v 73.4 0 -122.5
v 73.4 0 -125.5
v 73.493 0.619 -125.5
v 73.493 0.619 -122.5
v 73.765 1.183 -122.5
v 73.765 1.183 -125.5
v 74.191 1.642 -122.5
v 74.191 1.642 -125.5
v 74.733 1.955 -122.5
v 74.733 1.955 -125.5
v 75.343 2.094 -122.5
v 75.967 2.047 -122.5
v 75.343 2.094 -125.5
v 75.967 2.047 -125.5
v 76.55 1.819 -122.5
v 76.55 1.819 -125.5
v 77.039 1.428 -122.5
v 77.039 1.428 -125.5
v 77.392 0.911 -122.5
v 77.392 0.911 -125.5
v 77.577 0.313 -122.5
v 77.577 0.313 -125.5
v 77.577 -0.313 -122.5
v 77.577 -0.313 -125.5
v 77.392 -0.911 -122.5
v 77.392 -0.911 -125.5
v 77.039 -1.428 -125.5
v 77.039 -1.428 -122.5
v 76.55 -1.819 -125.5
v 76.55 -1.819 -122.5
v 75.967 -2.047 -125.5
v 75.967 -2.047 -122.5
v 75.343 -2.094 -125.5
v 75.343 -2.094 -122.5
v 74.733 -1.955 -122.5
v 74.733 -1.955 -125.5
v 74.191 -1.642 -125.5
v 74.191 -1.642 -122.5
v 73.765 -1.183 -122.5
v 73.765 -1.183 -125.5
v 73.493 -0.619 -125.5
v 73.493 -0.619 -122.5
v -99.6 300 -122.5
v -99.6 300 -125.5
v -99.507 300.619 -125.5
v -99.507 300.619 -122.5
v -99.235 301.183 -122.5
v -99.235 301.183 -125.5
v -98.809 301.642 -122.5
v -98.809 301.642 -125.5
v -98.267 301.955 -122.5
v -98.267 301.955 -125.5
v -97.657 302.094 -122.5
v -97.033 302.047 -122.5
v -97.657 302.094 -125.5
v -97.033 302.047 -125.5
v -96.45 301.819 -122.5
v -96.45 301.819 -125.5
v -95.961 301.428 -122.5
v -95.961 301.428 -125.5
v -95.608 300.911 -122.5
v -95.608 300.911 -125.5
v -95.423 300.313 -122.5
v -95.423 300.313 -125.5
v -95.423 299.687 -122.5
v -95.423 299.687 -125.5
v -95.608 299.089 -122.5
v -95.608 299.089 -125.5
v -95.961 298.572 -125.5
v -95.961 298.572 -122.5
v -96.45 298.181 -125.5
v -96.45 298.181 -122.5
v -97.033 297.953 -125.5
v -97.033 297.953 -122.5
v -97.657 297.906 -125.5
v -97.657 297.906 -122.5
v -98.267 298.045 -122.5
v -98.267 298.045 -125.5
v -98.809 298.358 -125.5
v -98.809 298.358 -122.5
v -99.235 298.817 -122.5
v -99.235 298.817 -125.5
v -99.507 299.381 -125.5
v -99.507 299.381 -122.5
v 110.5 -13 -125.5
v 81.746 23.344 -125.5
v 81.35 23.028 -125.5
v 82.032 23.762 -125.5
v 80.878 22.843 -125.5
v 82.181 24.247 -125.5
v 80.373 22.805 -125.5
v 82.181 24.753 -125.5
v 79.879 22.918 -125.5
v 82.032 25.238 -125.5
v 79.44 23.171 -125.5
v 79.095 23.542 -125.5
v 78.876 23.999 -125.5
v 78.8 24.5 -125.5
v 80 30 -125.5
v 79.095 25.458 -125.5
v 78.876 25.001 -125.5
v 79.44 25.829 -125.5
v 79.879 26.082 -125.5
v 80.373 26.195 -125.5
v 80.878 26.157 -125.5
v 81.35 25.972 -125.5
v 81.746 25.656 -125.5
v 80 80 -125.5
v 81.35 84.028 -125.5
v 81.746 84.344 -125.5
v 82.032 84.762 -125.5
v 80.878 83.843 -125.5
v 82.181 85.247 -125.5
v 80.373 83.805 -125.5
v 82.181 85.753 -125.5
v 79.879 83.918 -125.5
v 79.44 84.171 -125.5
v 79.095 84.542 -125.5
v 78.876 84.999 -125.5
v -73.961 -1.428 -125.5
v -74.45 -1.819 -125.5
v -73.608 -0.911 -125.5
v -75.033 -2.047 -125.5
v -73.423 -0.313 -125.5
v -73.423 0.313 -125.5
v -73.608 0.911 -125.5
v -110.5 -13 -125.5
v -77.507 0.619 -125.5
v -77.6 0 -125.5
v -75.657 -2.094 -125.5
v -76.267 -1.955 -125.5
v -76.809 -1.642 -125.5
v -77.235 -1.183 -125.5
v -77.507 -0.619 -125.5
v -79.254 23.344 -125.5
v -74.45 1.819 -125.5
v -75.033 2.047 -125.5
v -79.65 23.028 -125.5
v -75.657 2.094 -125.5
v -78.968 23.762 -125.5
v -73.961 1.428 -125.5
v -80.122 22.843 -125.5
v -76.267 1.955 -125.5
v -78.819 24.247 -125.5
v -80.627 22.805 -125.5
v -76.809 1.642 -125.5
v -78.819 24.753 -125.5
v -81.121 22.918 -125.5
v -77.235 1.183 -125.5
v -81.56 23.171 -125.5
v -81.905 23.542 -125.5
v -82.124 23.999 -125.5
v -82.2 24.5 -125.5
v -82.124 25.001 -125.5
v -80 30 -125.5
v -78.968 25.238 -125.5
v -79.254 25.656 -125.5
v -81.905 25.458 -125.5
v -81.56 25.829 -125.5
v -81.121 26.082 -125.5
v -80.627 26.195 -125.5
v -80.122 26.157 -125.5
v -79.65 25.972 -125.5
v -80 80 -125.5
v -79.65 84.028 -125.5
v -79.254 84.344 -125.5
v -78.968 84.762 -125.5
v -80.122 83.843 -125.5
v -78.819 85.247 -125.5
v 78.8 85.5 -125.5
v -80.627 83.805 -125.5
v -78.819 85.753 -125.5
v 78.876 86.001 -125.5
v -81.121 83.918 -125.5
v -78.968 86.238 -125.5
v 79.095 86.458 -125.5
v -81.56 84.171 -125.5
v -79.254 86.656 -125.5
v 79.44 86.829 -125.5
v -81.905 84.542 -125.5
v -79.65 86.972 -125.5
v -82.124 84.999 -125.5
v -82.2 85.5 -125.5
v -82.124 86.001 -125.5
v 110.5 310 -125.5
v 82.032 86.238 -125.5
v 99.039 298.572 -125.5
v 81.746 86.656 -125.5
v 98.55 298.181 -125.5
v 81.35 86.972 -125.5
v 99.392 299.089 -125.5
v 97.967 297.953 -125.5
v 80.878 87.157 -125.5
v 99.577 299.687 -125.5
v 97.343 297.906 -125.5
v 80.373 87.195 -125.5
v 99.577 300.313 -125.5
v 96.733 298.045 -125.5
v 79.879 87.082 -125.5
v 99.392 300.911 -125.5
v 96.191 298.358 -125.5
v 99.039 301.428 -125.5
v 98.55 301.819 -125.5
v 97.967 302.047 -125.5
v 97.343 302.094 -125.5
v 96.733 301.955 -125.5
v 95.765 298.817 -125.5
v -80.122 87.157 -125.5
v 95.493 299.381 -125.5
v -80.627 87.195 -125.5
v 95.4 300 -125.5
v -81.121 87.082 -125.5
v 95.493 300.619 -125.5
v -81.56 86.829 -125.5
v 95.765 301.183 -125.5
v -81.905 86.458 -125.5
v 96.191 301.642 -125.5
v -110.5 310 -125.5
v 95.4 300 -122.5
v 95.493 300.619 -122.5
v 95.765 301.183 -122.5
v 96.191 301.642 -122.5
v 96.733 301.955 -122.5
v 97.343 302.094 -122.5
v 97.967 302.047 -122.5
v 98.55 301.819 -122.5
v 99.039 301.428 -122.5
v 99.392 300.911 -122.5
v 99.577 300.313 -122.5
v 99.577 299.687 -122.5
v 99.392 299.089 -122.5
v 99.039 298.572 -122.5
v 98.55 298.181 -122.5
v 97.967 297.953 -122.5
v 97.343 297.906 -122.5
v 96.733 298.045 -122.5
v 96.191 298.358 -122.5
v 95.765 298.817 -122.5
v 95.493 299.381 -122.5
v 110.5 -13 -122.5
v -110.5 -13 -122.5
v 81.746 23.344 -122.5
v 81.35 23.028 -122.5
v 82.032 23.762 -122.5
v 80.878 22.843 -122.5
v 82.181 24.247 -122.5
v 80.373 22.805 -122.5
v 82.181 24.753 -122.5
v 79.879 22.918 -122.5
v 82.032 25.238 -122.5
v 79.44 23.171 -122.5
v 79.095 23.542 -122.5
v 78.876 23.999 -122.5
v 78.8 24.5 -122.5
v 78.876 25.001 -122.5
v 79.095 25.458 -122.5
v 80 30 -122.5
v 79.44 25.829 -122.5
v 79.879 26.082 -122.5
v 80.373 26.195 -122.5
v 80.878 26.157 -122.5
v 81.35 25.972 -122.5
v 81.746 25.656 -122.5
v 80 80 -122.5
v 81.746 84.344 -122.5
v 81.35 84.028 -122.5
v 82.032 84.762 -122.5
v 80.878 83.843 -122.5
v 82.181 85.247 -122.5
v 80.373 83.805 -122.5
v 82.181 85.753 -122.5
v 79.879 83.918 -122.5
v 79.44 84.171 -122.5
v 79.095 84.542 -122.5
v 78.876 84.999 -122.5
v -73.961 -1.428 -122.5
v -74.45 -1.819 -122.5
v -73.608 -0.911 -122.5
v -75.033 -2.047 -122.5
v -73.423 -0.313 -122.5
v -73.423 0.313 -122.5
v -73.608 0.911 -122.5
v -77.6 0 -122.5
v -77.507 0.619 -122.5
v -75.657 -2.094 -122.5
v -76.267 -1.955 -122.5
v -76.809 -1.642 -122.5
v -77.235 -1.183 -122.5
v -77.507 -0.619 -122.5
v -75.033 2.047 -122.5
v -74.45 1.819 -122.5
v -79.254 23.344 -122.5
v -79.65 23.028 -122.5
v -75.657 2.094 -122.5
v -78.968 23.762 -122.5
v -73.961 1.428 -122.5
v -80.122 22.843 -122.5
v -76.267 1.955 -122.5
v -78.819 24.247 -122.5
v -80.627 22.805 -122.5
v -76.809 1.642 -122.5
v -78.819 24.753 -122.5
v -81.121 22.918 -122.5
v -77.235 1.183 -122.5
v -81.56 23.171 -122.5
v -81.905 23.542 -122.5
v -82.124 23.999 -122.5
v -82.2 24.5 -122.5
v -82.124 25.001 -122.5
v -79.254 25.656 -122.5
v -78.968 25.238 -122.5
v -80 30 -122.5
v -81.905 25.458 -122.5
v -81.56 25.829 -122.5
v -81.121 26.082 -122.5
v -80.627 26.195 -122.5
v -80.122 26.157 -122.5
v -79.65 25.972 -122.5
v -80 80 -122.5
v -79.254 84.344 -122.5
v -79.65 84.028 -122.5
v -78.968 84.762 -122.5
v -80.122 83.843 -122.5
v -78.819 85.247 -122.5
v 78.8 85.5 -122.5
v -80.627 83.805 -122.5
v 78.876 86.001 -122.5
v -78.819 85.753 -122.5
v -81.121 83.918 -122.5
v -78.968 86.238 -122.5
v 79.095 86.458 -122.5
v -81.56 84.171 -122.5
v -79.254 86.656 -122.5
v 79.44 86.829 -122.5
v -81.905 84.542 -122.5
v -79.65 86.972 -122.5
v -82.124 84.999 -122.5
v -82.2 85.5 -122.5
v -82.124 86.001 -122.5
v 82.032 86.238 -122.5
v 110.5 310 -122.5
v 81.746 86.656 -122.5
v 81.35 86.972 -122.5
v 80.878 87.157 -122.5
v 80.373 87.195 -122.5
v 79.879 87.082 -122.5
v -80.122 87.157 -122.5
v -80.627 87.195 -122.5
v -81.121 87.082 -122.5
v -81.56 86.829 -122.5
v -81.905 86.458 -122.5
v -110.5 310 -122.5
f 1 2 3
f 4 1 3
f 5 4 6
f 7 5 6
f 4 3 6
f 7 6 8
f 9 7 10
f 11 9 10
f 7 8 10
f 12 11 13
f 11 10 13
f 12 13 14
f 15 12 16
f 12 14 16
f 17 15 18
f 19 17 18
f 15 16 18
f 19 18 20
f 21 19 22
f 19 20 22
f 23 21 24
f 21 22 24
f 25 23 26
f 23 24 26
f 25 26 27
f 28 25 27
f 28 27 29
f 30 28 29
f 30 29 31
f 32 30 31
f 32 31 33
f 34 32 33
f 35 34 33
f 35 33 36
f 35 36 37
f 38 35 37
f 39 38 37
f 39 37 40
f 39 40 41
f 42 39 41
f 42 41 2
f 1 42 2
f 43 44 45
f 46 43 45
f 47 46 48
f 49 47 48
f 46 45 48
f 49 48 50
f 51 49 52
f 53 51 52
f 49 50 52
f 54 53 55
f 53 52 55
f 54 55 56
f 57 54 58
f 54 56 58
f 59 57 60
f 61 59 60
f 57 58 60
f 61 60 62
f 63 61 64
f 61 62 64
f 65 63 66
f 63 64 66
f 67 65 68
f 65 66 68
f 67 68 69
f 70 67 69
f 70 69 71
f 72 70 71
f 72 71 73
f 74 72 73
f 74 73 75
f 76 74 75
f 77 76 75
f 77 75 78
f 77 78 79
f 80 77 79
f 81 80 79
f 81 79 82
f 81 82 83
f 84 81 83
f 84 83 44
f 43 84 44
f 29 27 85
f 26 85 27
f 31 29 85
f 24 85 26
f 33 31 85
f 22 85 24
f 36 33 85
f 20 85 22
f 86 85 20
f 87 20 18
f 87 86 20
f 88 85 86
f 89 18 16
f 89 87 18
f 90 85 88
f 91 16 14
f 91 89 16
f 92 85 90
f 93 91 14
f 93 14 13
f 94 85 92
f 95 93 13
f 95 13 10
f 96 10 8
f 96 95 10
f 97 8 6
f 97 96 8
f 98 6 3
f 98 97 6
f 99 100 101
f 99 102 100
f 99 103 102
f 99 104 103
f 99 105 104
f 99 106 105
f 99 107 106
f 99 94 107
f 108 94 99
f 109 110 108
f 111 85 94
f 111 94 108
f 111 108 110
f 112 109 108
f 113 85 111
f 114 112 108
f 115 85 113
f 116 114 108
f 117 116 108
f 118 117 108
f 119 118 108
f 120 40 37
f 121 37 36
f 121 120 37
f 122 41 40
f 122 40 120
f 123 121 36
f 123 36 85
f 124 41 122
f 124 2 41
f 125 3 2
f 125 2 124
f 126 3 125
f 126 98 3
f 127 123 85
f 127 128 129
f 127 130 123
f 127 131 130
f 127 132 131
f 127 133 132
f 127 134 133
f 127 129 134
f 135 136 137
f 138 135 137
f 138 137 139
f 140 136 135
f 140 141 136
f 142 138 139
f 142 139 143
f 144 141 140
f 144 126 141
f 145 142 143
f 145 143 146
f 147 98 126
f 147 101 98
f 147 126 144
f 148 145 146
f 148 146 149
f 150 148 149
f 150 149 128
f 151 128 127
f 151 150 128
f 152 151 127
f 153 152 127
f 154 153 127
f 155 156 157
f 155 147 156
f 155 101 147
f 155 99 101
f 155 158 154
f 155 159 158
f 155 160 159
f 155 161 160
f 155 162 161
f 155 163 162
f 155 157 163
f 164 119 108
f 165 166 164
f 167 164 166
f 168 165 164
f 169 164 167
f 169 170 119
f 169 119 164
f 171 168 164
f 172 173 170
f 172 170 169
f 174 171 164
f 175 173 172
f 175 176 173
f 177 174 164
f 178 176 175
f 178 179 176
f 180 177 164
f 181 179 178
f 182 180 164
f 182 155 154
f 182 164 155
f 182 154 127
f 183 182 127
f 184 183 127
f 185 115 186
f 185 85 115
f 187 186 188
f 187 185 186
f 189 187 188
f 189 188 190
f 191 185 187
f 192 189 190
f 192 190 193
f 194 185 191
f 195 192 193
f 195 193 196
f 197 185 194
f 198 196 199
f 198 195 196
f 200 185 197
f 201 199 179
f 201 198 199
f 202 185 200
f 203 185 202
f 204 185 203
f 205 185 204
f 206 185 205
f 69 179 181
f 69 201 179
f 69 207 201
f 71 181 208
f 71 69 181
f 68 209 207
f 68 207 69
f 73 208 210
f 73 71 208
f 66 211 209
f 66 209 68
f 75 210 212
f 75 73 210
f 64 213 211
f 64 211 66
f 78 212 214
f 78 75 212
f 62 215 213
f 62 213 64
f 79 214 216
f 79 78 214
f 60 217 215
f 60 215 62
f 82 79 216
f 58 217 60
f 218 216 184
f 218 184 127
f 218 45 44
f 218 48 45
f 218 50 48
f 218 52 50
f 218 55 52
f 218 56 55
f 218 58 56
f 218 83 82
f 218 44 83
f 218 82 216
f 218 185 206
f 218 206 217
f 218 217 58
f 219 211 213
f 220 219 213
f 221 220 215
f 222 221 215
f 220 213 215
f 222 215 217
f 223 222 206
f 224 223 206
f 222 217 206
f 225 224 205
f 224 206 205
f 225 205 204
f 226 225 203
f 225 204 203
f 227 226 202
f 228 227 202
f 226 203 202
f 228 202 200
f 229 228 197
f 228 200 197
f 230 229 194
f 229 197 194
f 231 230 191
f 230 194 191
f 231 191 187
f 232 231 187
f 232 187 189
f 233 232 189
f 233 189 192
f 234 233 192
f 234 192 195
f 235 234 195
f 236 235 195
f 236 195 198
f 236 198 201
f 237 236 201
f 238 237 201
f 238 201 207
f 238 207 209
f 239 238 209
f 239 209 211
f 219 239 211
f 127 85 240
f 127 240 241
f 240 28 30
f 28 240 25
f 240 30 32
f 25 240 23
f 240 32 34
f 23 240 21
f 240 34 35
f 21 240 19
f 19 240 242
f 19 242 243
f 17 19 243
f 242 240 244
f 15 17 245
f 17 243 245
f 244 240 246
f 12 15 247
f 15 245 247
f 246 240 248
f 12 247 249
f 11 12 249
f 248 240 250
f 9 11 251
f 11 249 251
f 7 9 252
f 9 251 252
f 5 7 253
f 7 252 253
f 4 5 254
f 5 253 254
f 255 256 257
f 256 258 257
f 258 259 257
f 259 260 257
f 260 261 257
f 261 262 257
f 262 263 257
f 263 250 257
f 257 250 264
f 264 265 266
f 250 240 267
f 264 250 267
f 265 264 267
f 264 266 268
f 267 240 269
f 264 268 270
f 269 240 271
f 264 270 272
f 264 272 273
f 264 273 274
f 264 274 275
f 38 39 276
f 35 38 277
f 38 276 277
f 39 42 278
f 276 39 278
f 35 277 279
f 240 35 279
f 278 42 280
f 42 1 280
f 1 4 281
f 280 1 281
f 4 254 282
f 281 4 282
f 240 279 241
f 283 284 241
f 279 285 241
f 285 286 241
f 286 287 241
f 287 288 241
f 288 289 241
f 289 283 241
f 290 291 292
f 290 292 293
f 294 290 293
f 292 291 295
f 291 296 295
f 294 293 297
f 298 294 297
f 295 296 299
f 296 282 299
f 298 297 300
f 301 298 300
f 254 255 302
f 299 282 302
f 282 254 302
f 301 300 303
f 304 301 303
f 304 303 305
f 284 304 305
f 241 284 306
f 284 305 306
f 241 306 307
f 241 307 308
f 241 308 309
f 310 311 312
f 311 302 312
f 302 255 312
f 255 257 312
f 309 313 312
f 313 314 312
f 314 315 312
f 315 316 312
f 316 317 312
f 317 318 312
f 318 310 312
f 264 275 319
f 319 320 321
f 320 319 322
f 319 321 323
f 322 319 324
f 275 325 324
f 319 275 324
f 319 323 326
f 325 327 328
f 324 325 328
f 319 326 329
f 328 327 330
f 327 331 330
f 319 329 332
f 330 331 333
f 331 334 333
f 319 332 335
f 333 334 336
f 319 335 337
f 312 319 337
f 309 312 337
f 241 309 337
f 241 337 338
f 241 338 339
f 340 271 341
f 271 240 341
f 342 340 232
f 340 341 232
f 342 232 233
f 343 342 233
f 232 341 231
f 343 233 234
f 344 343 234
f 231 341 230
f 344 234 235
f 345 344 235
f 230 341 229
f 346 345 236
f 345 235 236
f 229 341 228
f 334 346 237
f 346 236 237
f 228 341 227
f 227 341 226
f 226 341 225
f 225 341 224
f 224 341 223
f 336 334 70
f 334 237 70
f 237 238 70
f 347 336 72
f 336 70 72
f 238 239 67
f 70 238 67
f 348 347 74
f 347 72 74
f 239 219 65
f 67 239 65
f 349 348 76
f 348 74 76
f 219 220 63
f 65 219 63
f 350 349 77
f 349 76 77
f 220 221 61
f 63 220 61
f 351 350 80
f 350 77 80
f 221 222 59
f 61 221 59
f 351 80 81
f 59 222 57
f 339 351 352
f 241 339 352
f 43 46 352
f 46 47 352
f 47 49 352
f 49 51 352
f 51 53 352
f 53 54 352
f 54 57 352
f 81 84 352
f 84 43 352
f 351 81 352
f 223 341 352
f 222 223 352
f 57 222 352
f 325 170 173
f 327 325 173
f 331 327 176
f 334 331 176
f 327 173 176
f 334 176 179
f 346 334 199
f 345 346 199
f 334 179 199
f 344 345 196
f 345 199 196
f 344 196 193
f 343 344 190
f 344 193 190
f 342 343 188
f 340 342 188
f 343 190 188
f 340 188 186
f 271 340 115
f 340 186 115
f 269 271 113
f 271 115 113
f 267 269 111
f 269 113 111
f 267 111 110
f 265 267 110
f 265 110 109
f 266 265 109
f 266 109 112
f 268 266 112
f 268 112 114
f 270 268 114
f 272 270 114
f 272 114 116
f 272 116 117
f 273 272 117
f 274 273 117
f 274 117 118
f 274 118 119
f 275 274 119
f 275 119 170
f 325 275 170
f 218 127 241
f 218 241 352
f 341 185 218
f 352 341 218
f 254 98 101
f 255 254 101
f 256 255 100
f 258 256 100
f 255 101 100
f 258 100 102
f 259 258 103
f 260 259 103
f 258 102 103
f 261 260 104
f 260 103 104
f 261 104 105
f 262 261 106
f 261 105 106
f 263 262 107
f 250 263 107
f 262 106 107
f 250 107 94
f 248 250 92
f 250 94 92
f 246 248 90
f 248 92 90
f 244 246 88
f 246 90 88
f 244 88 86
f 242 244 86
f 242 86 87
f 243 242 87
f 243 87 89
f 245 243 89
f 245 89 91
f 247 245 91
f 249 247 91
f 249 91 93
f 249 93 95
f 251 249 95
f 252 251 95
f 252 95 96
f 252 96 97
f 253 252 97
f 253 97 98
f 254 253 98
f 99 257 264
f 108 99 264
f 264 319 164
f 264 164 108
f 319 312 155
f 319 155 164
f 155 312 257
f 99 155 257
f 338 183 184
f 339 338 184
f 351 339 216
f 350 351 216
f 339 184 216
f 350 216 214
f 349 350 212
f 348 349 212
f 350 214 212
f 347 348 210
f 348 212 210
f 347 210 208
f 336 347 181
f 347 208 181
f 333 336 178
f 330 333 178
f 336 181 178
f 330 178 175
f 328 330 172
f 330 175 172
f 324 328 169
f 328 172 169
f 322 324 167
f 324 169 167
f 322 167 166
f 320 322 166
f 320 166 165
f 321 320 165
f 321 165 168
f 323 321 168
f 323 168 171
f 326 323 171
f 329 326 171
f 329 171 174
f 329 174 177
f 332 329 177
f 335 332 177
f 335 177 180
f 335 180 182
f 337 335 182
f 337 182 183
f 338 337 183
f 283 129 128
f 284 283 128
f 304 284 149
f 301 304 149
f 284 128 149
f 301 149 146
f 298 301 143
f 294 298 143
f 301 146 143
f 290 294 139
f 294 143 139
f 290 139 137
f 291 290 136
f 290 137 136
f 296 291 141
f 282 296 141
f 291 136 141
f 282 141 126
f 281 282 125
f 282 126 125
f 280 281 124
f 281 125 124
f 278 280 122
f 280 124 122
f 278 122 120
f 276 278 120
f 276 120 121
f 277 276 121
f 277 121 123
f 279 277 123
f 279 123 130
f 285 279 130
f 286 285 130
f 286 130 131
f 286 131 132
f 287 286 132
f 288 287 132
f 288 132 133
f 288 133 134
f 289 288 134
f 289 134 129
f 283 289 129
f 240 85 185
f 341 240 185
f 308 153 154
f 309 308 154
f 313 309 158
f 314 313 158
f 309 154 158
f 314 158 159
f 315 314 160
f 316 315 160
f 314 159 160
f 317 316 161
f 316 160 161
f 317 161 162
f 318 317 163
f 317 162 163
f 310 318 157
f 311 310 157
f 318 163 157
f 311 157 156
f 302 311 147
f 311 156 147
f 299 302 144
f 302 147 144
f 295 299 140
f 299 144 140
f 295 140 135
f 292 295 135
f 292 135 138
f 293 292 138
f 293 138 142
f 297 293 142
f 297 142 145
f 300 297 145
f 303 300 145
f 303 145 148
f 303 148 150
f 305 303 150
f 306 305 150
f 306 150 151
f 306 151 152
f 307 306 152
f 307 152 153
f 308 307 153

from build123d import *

# Parameters (mm, degrees)
SKETCH1_W                 = 221
SKETCH1_H                 = 323
BOSS_EXTRUDE1_DEPTH       = 3
SKETCH2_W                 = 160
SKETCH2_H                 = 50
CUT_EXTRUDE1_DEPTH        = 4
CUT_EXTRUDE2_REACH        = 5
SKETCH5_R                 = 1.7
F_4_0MM_DOWEL_HOLE1_D     = 4.2
F_4_0MM_DOWEL_HOLE1_DEPTH = 3


with BuildPart() as part:
    # Sketch1 → Boss-Extrude1 (new body)
    with BuildSketch(Plane(origin=(0, 0, -125.5), x_dir=(-1, 0, 0), z_dir=(0, 0, -1))):
        with Locations((0, 148.5)):
            Rectangle(SKETCH1_W, SKETCH1_H)
    extrude(amount=-BOSS_EXTRUDE1_DEPTH)

    # Sketch2 → Cut-Extrude1 (cut, through all)
    with BuildSketch(Plane.XY.offset(-122.5)):
        with Locations((0, 55)):
            Rectangle(SKETCH2_W, SKETCH2_H)
    extrude(amount=-CUT_EXTRUDE1_DEPTH, mode=Mode.SUBTRACT)

    # Sketch5 → Cut-Extrude2 (cut, up to next)
    with BuildSketch(Plane(origin=(0, 0, -125.5), x_dir=(-1, 0, 0), z_dir=(0, 0, -1)), mode=Mode.PRIVATE) as cut_extrude2_sk1:
        with Locations((80.5, 85.5)):
            Circle(SKETCH5_R)
    cut_extrude2_tool1 = extrude(cut_extrude2_sk1.sketch, amount=-CUT_EXTRUDE2_REACH, mode=Mode.PRIVATE) & part.part
    add(cut_extrude2_tool1.solids().sort_by_distance((-80.5, 85.5, -125.5))[0], mode=Mode.SUBTRACT)
    # Sketch5 → Cut-Extrude2 (cut, up to next)
    with BuildSketch(Plane(origin=(0, 0, -125.5), x_dir=(-1, 0, 0), z_dir=(0, 0, -1)), mode=Mode.PRIVATE) as cut_extrude2_sk2:
        with Locations((80.5, 24.5)):
            Circle(SKETCH5_R)
    cut_extrude2_tool2 = extrude(cut_extrude2_sk2.sketch, amount=-CUT_EXTRUDE2_REACH, mode=Mode.PRIVATE) & part.part
    add(cut_extrude2_tool2.solids().sort_by_distance((-80.5, 24.5, -125.5))[0], mode=Mode.SUBTRACT)
    # Sketch5 → Cut-Extrude2 (cut, up to next)
    with BuildSketch(Plane(origin=(0, 0, -125.5), x_dir=(-1, 0, 0), z_dir=(0, 0, -1)), mode=Mode.PRIVATE) as cut_extrude2_sk3:
        with Locations((-80.5, 24.5)):
            Circle(SKETCH5_R)
    cut_extrude2_tool3 = extrude(cut_extrude2_sk3.sketch, amount=-CUT_EXTRUDE2_REACH, mode=Mode.PRIVATE) & part.part
    add(cut_extrude2_tool3.solids().sort_by_distance((80.5, 24.5, -125.5))[0], mode=Mode.SUBTRACT)
    # Sketch5 → Cut-Extrude2 (cut, up to next)
    with BuildSketch(Plane(origin=(0, 0, -125.5), x_dir=(-1, 0, 0), z_dir=(0, 0, -1)), mode=Mode.PRIVATE) as cut_extrude2_sk4:
        with Locations((-80.5, 85.5)):
            Circle(SKETCH5_R)
    cut_extrude2_tool4 = extrude(cut_extrude2_sk4.sketch, amount=-CUT_EXTRUDE2_REACH, mode=Mode.PRIVATE) & part.part
    add(cut_extrude2_tool4.solids().sort_by_distance((80.5, 85.5, -125.5))[0], mode=Mode.SUBTRACT)

    # Ø4.0mm Dowel Hole1
    with Locations(Plane.XY.offset(-122.5)):
        with Locations((-97.5, 300), (97.5, 300), (75.5, 0), (-75.5, 0)):
            Hole(F_4_0MM_DOWEL_HOLE1_D / 2, depth=F_4_0MM_DOWEL_HOLE1_DEPTH)


solid = part.part
